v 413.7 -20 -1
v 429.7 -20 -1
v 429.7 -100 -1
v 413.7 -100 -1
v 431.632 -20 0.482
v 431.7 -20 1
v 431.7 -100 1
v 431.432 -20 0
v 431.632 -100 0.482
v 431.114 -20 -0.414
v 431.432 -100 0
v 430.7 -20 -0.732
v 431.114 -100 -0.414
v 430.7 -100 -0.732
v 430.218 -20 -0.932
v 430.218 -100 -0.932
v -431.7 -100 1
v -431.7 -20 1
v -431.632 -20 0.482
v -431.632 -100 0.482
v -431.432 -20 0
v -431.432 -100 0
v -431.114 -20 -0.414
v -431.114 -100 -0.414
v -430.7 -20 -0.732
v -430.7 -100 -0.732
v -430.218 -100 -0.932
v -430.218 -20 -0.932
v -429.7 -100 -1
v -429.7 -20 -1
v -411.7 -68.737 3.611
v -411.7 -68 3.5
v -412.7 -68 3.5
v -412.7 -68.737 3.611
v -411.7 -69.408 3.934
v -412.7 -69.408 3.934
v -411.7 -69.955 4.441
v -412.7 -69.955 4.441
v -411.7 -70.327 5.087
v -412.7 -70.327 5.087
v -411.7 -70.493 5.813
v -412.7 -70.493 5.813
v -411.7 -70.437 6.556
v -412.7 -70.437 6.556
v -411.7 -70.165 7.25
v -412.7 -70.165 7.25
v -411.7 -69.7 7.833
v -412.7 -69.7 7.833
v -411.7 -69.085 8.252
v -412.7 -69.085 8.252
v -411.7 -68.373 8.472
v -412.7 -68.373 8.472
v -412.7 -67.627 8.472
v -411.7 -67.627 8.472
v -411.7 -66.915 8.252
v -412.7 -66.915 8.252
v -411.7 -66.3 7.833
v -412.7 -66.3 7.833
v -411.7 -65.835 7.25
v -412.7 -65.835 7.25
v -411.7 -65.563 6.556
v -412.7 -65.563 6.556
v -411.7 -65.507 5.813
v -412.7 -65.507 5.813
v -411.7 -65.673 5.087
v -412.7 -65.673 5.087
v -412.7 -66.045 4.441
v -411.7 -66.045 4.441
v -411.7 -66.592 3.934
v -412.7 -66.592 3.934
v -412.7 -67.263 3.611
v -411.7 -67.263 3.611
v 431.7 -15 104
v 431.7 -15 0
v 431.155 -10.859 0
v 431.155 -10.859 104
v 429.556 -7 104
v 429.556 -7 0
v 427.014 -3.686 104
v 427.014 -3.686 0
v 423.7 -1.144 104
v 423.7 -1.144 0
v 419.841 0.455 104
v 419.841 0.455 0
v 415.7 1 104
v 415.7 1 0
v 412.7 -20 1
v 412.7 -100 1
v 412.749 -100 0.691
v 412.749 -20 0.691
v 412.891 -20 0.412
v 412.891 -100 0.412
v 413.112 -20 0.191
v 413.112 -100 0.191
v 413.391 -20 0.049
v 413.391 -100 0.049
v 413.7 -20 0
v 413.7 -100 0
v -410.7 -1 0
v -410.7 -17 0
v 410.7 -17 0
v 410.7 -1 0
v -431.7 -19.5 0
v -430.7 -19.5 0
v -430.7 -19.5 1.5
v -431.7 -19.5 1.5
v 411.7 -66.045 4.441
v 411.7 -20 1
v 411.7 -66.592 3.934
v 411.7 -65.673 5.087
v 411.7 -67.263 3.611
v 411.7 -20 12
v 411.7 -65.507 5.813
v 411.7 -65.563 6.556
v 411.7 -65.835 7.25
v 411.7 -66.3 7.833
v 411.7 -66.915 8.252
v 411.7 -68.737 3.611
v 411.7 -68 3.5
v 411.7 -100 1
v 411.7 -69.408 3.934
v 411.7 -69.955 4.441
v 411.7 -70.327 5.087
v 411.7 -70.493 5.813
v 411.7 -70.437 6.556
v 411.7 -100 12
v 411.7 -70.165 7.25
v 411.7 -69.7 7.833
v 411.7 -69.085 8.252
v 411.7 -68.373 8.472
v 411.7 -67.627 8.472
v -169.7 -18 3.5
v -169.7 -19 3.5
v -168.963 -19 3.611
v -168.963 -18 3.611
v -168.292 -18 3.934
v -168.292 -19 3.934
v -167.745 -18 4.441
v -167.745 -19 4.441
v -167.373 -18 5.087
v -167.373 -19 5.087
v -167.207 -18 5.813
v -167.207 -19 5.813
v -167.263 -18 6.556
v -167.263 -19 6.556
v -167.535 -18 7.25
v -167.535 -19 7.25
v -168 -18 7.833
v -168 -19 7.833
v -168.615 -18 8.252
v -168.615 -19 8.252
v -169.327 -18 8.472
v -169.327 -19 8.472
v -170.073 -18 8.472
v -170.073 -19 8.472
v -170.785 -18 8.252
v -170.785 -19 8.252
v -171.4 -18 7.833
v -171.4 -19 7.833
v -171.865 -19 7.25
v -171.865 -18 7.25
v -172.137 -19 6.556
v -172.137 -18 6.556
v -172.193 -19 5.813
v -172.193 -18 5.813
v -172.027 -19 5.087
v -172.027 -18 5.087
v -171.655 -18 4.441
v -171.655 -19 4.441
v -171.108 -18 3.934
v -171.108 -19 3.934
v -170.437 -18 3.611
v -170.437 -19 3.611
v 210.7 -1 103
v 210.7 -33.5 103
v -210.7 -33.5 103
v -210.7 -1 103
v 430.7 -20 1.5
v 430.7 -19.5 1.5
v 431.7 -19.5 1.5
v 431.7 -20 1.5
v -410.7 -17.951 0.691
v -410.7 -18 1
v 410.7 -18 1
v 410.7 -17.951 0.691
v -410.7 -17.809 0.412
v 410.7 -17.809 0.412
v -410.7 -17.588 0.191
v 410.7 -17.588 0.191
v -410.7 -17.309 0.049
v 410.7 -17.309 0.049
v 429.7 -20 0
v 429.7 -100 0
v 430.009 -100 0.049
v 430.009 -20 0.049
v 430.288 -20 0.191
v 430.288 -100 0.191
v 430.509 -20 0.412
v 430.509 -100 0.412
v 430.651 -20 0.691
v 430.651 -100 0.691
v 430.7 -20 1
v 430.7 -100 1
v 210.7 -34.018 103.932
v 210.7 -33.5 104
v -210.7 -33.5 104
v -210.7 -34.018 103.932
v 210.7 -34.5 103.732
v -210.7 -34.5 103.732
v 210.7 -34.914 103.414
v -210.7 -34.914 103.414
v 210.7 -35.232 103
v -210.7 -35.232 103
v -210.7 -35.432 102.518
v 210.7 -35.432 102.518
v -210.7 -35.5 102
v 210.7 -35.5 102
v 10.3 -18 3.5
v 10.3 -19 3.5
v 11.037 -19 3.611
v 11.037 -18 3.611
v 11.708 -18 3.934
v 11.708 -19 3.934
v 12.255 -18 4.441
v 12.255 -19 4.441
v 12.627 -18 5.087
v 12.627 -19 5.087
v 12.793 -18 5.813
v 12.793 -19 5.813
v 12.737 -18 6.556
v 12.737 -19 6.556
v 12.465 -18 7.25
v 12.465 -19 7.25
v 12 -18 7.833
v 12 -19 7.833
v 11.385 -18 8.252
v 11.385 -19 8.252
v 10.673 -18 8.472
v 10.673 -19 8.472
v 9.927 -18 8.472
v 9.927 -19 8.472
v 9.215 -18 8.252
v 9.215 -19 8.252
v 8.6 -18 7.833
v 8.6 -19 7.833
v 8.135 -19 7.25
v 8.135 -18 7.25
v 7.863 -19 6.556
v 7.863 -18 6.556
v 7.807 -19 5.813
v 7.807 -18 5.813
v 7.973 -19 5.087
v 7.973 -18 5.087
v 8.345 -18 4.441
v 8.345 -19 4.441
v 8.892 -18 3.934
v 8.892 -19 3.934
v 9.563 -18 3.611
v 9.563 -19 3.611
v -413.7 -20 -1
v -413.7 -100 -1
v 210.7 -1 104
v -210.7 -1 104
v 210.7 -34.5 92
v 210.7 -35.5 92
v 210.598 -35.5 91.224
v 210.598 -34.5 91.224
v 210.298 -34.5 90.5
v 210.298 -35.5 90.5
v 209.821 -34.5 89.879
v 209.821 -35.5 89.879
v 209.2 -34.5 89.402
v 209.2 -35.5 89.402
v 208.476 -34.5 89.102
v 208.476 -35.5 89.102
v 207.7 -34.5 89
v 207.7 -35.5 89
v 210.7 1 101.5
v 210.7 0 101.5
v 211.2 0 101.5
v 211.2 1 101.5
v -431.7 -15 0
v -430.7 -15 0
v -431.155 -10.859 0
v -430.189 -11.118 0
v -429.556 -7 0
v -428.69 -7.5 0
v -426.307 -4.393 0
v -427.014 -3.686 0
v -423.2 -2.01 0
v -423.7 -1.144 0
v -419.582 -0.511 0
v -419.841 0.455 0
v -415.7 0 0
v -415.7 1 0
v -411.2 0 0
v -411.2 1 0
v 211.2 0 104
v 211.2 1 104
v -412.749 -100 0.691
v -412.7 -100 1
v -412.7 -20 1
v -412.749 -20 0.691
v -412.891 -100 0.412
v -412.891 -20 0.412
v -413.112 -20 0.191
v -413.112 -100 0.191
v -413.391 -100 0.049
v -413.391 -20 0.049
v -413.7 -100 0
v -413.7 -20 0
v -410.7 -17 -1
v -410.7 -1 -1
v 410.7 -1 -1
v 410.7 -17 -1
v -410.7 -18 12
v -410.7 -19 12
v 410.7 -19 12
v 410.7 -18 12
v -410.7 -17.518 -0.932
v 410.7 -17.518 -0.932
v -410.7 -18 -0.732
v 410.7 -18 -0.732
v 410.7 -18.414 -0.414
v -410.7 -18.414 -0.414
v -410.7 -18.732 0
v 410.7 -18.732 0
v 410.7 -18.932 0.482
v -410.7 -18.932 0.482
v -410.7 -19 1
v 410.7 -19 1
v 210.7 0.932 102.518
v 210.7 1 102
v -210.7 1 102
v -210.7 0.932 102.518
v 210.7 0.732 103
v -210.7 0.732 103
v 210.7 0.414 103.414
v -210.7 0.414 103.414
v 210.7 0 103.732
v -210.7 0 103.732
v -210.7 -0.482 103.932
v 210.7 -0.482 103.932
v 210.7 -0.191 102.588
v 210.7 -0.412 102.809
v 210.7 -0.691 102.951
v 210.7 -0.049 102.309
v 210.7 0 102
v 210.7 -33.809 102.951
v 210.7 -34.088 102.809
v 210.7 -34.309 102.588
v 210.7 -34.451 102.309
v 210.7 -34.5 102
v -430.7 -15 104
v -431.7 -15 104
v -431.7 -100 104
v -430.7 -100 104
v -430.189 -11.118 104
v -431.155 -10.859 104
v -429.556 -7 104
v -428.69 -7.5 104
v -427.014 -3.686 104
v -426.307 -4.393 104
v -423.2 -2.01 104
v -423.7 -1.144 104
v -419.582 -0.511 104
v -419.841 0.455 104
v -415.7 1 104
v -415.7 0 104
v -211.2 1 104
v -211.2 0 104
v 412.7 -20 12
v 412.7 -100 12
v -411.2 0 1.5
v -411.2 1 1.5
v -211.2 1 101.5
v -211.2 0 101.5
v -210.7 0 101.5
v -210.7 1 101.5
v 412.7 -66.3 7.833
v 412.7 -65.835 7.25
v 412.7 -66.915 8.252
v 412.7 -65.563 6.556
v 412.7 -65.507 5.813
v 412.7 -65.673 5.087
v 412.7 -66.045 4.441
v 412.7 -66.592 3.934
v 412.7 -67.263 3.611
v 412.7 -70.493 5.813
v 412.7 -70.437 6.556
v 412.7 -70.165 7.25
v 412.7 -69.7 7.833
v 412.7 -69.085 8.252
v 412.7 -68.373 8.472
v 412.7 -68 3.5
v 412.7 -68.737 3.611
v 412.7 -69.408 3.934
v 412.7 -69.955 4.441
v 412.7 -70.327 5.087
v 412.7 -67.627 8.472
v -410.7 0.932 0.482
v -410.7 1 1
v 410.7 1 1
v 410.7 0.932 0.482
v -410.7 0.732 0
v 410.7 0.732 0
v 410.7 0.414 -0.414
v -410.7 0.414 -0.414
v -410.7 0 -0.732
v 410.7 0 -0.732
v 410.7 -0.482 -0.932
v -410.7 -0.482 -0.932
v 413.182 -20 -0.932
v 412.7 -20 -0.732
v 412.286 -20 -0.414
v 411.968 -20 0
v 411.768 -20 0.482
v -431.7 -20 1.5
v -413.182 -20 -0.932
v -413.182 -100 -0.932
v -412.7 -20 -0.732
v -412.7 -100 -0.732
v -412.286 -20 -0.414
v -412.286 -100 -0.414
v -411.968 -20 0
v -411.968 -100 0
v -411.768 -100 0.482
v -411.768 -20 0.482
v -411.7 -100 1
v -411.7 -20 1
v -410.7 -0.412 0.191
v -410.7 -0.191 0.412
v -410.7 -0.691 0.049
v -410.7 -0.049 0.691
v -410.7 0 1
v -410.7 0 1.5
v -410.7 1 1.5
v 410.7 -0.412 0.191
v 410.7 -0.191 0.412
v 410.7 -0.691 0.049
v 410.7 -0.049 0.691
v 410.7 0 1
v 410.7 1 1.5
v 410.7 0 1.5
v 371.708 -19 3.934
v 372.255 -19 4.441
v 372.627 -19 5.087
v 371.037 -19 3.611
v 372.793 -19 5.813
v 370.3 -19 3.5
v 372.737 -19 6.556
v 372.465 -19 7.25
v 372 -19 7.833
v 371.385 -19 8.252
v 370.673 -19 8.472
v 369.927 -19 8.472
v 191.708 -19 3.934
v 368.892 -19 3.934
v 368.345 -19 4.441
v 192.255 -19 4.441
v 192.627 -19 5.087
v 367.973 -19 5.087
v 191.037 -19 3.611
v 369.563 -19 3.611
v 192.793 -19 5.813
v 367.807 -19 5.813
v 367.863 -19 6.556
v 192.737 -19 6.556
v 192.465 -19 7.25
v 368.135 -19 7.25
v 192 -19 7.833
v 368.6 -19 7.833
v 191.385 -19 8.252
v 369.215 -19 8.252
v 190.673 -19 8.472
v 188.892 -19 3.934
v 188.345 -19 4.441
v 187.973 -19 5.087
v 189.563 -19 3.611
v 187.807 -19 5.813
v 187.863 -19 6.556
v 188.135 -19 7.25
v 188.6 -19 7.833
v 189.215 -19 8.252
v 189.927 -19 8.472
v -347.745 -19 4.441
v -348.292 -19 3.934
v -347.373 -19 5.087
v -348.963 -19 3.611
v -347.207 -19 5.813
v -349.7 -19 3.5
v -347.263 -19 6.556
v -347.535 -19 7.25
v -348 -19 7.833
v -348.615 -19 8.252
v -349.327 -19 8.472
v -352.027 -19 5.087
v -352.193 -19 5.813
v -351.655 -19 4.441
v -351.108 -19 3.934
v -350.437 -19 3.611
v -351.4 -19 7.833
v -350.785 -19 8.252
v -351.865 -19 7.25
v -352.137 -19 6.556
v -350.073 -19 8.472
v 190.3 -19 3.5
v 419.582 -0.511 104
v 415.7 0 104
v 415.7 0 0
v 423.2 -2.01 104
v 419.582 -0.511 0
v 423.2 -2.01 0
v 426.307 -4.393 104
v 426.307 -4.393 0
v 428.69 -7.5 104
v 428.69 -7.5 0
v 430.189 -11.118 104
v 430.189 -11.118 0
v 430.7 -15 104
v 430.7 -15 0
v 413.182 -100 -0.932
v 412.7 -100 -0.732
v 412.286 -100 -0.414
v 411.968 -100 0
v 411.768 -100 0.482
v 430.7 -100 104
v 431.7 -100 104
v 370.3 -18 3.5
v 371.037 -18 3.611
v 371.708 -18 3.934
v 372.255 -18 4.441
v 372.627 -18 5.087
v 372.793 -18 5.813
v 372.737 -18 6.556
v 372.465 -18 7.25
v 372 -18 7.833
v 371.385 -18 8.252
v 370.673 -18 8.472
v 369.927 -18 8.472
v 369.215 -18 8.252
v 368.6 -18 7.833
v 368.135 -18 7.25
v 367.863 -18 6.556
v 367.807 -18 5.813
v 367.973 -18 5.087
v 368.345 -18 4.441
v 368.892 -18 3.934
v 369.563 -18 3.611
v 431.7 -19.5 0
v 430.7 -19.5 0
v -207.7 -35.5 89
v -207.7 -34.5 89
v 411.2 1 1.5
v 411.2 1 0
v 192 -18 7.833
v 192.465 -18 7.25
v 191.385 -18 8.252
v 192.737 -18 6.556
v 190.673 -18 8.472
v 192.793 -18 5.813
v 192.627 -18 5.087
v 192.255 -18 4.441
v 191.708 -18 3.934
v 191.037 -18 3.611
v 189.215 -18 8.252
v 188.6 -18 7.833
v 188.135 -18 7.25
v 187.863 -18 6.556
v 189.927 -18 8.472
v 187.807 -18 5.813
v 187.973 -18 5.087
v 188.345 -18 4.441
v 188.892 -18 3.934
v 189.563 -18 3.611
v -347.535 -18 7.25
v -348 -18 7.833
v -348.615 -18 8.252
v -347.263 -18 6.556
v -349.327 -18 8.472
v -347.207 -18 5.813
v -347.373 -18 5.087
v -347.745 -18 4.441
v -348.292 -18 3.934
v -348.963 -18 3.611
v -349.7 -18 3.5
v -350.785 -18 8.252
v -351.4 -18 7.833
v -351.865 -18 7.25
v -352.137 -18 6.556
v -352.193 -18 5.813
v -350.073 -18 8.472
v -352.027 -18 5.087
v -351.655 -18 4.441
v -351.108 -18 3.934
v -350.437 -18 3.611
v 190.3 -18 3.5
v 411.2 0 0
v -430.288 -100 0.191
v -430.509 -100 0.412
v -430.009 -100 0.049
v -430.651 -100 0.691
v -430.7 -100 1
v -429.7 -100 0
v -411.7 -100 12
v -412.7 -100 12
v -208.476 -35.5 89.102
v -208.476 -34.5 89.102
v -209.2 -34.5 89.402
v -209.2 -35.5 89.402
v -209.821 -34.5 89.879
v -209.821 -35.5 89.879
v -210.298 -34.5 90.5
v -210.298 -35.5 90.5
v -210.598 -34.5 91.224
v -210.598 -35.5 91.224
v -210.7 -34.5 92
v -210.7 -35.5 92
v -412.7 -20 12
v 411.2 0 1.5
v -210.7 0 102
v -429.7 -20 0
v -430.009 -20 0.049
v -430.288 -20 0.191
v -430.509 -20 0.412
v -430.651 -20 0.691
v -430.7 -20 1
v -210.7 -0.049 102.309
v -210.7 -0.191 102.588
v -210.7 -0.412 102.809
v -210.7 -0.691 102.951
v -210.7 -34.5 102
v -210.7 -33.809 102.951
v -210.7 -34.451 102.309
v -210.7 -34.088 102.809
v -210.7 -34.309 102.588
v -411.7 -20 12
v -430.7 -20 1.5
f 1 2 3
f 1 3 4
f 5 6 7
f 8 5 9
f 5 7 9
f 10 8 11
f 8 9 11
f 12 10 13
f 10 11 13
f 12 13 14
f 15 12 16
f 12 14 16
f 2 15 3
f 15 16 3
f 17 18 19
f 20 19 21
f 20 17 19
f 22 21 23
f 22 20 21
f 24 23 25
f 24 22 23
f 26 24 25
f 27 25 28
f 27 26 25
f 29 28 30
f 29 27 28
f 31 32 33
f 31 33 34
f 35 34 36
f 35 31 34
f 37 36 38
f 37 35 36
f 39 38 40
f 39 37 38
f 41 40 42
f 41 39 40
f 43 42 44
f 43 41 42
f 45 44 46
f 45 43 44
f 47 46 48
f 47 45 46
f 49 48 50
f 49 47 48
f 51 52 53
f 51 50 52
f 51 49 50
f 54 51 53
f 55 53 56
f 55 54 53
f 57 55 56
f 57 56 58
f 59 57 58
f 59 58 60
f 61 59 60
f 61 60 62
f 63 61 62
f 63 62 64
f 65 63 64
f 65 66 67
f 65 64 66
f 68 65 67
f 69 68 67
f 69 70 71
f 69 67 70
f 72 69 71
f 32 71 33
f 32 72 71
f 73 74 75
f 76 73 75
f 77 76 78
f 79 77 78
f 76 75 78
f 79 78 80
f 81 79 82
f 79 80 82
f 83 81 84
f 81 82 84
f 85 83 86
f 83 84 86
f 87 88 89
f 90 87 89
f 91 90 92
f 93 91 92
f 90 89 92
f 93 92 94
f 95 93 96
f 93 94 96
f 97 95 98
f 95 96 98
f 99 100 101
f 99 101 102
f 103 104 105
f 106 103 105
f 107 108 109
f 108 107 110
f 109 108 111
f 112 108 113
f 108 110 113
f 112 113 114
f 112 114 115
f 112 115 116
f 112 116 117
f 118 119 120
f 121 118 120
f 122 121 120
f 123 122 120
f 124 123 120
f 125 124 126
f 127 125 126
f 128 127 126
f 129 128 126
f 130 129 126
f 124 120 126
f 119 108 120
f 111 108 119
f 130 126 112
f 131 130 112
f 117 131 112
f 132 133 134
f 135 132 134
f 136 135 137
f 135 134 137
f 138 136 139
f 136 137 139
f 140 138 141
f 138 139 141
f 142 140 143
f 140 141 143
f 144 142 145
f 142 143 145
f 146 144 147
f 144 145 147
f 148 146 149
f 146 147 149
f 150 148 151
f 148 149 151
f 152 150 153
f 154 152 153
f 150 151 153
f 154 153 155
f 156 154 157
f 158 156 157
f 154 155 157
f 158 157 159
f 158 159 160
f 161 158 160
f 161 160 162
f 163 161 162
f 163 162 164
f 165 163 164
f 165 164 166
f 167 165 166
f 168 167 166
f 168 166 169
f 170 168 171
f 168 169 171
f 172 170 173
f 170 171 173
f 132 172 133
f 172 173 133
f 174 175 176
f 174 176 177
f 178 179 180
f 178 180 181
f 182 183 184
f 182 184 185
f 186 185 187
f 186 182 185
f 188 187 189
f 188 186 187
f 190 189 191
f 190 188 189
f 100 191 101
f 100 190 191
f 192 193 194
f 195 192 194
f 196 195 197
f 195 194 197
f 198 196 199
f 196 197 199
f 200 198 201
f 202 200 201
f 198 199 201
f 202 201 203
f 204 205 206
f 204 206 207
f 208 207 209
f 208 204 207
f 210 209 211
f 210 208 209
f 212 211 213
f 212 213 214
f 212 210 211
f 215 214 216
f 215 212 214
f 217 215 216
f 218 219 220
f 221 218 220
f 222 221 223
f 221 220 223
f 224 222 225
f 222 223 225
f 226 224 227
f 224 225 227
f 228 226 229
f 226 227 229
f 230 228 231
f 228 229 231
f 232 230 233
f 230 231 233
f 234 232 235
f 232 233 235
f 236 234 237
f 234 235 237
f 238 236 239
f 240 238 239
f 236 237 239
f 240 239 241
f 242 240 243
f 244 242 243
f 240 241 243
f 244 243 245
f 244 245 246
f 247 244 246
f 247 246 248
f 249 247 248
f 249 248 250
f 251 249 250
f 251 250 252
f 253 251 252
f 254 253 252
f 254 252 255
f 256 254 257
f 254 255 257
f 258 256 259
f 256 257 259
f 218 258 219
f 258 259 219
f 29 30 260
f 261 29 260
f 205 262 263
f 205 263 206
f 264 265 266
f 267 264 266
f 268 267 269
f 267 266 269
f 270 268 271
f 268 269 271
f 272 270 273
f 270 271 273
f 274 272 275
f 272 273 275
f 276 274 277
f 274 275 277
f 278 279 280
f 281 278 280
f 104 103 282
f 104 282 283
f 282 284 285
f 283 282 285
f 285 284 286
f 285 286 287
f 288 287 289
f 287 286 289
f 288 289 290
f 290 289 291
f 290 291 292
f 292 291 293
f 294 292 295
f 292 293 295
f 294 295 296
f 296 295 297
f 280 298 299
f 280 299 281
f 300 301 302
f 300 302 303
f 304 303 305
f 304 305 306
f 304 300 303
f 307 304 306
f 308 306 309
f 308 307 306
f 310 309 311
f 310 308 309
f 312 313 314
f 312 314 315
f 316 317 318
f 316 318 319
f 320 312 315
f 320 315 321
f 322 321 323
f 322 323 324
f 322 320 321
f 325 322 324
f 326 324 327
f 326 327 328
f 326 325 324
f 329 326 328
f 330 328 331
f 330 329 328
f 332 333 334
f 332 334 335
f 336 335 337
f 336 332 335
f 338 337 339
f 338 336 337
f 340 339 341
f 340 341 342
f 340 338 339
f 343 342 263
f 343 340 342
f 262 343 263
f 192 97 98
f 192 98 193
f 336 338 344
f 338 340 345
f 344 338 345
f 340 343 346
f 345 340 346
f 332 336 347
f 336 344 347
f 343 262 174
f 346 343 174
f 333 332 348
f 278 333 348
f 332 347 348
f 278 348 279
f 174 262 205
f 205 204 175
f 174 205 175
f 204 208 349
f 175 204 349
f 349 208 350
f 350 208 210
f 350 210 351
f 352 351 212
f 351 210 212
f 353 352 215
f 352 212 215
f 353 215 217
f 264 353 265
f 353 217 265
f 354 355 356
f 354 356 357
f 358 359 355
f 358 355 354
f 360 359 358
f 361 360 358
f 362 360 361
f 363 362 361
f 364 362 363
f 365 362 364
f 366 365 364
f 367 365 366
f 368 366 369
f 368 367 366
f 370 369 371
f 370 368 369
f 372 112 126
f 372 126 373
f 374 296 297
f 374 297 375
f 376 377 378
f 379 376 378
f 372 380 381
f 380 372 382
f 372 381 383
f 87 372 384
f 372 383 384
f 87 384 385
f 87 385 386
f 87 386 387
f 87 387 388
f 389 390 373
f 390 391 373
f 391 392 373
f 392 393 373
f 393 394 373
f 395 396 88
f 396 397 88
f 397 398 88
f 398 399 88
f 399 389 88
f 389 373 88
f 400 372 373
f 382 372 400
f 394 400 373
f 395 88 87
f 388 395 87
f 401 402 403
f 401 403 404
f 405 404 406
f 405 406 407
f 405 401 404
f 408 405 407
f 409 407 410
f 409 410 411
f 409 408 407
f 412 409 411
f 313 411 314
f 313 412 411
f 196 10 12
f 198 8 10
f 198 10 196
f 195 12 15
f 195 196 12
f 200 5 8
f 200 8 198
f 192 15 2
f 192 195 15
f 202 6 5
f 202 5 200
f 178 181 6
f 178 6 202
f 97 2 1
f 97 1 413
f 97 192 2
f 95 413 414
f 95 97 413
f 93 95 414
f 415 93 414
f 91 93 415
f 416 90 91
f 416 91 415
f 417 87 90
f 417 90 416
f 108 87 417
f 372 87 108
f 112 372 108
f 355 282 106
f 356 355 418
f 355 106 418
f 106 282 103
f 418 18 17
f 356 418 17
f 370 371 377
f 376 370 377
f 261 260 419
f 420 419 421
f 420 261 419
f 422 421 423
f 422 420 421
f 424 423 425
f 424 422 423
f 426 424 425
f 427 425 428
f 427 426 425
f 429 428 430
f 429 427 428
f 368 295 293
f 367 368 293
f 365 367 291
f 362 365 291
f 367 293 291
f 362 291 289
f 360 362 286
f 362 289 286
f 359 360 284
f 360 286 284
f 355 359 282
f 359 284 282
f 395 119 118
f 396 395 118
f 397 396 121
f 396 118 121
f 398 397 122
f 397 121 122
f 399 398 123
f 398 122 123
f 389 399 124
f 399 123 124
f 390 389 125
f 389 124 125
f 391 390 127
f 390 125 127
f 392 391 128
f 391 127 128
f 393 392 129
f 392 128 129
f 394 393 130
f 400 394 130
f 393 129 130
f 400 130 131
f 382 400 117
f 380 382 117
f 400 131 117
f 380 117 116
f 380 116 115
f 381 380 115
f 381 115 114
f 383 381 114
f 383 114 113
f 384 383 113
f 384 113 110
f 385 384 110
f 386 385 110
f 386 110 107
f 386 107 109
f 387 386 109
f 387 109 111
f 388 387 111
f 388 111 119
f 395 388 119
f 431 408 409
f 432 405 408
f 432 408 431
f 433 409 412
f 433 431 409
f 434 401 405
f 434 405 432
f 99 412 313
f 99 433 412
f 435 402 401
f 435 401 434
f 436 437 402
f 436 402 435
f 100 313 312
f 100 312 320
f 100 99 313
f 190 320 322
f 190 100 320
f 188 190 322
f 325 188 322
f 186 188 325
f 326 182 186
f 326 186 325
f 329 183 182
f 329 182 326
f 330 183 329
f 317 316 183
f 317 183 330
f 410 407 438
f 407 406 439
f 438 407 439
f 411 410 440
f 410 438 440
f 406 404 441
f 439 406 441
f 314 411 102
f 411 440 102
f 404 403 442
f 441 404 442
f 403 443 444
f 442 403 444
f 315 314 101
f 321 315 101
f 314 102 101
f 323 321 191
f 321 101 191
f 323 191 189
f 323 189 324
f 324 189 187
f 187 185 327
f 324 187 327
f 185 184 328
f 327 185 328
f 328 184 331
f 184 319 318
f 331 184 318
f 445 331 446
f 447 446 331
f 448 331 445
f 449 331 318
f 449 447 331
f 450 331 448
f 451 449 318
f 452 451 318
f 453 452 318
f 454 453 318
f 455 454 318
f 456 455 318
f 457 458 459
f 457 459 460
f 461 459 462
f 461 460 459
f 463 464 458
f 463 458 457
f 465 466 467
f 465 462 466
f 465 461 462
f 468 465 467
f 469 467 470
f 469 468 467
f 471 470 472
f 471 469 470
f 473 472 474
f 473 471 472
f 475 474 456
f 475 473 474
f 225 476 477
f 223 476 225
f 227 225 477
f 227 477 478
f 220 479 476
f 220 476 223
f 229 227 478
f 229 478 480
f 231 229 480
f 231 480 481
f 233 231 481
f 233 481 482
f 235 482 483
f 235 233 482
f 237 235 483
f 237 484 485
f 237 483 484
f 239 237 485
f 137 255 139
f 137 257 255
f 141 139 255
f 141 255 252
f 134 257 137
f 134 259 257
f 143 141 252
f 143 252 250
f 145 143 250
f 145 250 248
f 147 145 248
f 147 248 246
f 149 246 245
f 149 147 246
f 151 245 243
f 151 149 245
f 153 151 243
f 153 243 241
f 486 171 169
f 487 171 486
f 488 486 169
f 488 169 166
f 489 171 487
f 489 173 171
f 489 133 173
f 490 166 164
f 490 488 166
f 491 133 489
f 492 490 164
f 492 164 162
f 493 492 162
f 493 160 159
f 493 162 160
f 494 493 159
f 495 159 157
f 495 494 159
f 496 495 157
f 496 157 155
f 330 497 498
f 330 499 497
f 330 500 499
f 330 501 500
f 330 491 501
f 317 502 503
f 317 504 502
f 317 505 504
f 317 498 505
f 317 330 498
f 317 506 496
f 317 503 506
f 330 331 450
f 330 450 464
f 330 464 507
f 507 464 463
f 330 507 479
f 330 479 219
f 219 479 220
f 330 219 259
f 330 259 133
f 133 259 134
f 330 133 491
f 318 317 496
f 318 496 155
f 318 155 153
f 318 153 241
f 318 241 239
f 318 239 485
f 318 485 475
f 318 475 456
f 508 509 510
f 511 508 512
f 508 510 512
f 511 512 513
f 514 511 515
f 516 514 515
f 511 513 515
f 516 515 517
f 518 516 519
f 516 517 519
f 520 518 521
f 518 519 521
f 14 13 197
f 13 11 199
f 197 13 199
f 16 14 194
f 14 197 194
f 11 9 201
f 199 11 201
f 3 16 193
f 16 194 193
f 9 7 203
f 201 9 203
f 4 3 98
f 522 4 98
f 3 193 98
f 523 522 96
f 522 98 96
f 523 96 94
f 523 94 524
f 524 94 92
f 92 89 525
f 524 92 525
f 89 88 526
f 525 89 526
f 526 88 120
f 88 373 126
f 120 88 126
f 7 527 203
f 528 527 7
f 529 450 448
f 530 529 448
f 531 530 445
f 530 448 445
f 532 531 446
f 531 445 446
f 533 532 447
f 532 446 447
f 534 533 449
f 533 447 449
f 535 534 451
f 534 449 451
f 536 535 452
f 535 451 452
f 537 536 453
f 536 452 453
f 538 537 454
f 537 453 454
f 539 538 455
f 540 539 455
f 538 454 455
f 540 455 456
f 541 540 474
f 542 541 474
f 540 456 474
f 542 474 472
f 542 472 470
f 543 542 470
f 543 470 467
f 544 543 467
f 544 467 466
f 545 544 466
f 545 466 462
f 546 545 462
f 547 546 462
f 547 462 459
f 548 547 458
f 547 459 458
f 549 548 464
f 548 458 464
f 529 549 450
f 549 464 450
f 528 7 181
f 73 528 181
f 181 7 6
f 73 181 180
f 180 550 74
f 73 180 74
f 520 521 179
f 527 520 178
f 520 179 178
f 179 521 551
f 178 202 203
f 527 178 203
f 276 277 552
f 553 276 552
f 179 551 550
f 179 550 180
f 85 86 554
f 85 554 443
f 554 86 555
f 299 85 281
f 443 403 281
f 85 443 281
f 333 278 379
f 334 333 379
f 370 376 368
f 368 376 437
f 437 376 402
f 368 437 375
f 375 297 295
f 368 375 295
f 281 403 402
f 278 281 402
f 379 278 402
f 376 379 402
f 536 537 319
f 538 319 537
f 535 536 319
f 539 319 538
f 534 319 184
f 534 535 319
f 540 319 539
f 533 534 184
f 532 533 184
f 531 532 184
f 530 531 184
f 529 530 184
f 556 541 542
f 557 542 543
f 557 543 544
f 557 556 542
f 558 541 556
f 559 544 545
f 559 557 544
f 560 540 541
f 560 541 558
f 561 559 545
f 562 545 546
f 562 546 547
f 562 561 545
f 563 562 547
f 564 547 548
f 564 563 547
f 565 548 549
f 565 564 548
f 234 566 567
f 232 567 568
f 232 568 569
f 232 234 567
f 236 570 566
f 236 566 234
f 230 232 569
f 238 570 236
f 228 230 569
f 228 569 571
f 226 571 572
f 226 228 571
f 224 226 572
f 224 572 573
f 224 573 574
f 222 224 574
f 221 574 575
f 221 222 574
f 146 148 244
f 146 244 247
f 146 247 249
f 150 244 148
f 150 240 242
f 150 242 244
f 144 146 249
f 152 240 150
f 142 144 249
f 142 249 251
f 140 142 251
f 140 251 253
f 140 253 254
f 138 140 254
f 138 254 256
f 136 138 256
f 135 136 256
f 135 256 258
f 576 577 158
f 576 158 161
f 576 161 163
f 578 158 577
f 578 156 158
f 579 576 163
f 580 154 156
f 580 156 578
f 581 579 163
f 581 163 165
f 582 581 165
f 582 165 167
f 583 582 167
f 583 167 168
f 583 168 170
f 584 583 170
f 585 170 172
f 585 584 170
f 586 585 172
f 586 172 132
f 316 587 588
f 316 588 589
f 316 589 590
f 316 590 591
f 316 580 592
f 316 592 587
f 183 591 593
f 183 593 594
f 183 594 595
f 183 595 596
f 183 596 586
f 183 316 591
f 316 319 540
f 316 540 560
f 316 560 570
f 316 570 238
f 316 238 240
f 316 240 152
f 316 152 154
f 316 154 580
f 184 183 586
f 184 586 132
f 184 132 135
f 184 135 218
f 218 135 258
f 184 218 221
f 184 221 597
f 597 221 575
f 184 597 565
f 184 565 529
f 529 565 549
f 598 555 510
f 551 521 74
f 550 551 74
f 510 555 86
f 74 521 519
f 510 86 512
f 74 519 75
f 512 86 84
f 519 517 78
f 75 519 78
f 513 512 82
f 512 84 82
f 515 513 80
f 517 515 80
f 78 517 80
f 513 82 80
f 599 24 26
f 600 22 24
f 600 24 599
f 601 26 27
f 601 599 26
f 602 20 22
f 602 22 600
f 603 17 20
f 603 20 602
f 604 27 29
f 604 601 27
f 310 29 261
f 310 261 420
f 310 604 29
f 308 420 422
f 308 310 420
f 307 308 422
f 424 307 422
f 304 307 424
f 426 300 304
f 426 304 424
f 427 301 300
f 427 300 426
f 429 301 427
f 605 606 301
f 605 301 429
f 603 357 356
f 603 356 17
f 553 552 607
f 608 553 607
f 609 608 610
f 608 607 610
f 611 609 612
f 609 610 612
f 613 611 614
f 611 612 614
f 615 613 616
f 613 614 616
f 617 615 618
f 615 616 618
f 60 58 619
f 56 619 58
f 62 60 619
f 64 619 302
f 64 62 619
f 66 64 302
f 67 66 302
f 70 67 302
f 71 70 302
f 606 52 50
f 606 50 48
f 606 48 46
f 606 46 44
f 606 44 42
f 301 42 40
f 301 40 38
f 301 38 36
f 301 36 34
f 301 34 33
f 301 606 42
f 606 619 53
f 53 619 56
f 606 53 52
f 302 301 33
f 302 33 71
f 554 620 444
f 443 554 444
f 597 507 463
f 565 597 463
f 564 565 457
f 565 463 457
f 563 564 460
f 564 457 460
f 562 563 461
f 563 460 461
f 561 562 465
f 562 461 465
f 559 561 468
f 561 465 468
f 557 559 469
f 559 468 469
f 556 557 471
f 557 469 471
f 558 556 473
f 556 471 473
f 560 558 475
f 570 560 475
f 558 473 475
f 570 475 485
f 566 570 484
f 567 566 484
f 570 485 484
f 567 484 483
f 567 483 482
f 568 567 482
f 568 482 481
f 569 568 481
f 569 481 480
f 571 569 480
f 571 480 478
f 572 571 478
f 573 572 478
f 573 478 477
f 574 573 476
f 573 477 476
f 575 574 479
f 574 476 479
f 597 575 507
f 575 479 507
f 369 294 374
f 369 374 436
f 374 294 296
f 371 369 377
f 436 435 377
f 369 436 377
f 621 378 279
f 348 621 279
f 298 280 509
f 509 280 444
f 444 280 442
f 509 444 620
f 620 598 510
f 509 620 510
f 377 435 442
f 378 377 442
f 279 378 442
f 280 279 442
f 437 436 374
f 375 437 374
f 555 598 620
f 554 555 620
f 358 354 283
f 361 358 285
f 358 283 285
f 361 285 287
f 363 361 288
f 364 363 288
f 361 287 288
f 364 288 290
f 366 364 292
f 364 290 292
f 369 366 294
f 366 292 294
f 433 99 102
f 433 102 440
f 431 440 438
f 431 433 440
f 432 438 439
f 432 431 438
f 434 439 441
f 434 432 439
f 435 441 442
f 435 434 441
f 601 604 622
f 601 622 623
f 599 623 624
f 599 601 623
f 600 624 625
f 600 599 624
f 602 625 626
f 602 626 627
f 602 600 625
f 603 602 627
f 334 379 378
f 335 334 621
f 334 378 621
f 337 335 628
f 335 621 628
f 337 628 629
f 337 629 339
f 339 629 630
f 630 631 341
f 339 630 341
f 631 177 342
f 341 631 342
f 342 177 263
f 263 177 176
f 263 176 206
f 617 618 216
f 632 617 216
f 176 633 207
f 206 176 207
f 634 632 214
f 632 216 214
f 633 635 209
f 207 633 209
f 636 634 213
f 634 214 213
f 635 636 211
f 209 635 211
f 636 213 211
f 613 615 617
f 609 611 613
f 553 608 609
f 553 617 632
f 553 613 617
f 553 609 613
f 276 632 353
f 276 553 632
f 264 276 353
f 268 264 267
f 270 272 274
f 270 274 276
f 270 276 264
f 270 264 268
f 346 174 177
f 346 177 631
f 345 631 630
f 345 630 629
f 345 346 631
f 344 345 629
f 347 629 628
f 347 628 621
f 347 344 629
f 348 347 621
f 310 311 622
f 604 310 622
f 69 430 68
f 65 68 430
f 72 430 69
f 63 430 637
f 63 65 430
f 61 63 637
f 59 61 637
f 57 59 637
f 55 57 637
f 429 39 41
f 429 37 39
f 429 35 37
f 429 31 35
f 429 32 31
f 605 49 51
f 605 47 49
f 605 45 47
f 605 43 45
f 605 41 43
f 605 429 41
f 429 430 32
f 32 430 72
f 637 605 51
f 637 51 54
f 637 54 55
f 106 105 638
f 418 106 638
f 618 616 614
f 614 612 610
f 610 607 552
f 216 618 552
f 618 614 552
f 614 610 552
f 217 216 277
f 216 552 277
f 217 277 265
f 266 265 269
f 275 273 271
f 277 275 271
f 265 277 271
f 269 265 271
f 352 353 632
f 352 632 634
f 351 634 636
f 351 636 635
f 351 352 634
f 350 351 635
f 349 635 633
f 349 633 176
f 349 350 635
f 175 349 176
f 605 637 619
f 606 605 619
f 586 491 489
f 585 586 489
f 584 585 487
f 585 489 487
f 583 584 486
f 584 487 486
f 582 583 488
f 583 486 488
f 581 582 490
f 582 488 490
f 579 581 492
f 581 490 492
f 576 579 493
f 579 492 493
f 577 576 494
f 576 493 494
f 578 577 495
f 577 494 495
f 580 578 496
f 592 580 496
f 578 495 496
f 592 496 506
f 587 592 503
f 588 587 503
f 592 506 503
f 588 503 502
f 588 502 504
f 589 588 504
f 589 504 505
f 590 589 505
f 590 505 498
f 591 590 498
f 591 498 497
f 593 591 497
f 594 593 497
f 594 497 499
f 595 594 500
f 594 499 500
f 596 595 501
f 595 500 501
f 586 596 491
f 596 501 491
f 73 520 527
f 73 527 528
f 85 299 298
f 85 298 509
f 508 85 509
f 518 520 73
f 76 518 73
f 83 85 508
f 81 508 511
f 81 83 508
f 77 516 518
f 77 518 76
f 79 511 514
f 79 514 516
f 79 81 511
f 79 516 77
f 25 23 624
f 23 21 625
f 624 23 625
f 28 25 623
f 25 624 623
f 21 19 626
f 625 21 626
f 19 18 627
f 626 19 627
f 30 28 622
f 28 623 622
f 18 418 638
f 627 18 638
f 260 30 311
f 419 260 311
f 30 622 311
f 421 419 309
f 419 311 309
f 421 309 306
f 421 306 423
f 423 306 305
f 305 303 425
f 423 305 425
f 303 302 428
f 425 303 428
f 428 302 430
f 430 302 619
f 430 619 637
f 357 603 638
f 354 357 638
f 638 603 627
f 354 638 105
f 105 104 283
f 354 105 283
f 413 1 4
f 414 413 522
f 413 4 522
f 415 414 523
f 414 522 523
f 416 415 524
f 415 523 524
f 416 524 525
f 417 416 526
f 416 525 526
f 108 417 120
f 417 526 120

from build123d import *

# Parameters (mm, degrees)
BASE_FLANGE1_DEPTH             = 104
EDGE_FLANGE1_STRIP_W           = 6
EDGE_FLANGE1_STRIP_H           = 1
EDGE_FLANGE1_STRIP_CUT_DEPTH   = 821.4
EDGE_FLANGE1_RELIEF_W          = 6.5
EDGE_FLANGE1_RELIEF_H          = 0.5
EDGE_FLANGE1_RELIEF_CUT_DEPTH  = 1
EDGE_FLANGE1_DEPTH             = 821.4
EDGE_FLANGE2_STRIP_W           = 6
EDGE_FLANGE2_STRIP_H           = 1
EDGE_FLANGE2_STRIP_CUT_DEPTH   = 821.4
EDGE_FLANGE2_DEPTH             = 821.4
EDGE_FLANGE3_STRIP_W           = 6
EDGE_FLANGE3_STRIP_H           = 1
EDGE_FLANGE3_STRIP_CUT_DEPTH   = 80
EDGE_FLANGE3_RELIEF_W          = 6.5
EDGE_FLANGE3_RELIEF_H          = 0.5
EDGE_FLANGE3_RELIEF_CUT_DEPTH  = 1
EDGE_FLANGE3_DEPTH             = 80
EDGE_FLANGE4_STRIP_W           = 6
EDGE_FLANGE4_STRIP_H           = 1
EDGE_FLANGE4_STRIP_CUT_DEPTH   = 80
EDGE_FLANGE4_DEPTH             = 80
EDGE_FLANGE5_STRIP_W           = 6
EDGE_FLANGE5_STRIP_H           = 1
EDGE_FLANGE5_STRIP_CUT_DEPTH   = 421.4
EDGE_FLANGE5_RELIEF_W          = 6.5
EDGE_FLANGE5_RELIEF_H          = 0.5
EDGE_FLANGE5_RELIEF_CUT_DEPTH  = 1
EDGE_FLANGE5_DEPTH             = 421.4
SKETCH22_R                     = 2.5
CUT_EXTRUDE1_DEPTH             = 1
SKETCH23_R                     = 2.5
CUT_EXTRUDE2_DEPTH             = 3
CUT_EXTRUDE2_DIRECTION_2_REACH = 857.652
EDGE_FLANGE6_STRIP_W           = 6
EDGE_FLANGE6_STRIP_H           = 1
EDGE_FLANGE6_STRIP_CUT_DEPTH   = 421.4
EDGE_FLANGE6_DEPTH             = 421.4
EDGE_FLANGE6_FLAT_DEPTH        = 1


# Sheet-metal steps are written as plain solids
with BuildPart() as part:
    # Sketch1 → Base-Flange1 (new body)
    with BuildSketch(Plane.XY):
        with BuildLine():
            Line((-430.7, -100), (-430.7, -15))
            ThreePointArc((-430.7, -15), (-426.306601718, -4.393398282), (-415.7, 0))
            Line((-415.7, 0), (415.7, 0))
            ThreePointArc((415.7, 0), (426.306601718, -4.393398282), (430.7, -15))
            Line((430.7, -15), (430.7, -100))
            Line((430.7, -100), (431.7, -100))
            Line((431.7, -100), (431.7, -15))
            ThreePointArc((431.7, -15), (427.013708499, -3.686291501), (415.7, 1))
            Line((415.7, 1), (-415.7, 1))
            ThreePointArc((-415.7, 1), (-427.013708499, -3.686291501), (-431.7, -15))
            Line((-431.7, -15), (-431.7, -100))
            Line((-431.7, -100), (-430.7, -100))
        make_face()
    extrude(amount=BASE_FLANGE1_DEPTH)

    # Edge-Flange1 strip (across the edge) → Edge-Flange1 strip cut (cut)
    with BuildSketch(Plane(origin=(-410.7, 0, 0), x_dir=(0, 0, 1), z_dir=(1, 0, 0))):
        with Locations((-2, -0.5)):
            Rectangle(EDGE_FLANGE1_STRIP_W, EDGE_FLANGE1_STRIP_H)
    extrude(amount=EDGE_FLANGE1_STRIP_CUT_DEPTH, mode=Mode.SUBTRACT)

    # Edge-Flange1 relief (on the sheet) → Edge-Flange1 relief cut (cut)
    with BuildSketch(Plane(origin=(-410.7, 0, 1), x_dir=(0, 0, 1), z_dir=(0, -1, 0))):
        with Locations((-2.75, 0.25)):
            Rectangle(EDGE_FLANGE1_RELIEF_W, EDGE_FLANGE1_RELIEF_H)
        with Locations((-2.75, -821.65)):
            Rectangle(EDGE_FLANGE1_RELIEF_W, EDGE_FLANGE1_RELIEF_H)
    extrude(amount=-EDGE_FLANGE1_RELIEF_CUT_DEPTH, mode=Mode.SUBTRACT)

    # Edge-Flange1 section (across the edge) → Edge-Flange1 (add)
    with BuildSketch(Plane(origin=(-410.7, 0, 0), x_dir=(0, 0, 1), z_dir=(1, 0, 0))):
        with BuildLine():
            Line((-1, 1), (-1, 19))
            Line((-1, 19), (0, 19))
            Line((0, 19), (0, 1))
            ThreePointArc((0, 1), (0.292893219, 0.292893219), (1, 0))
            Line((1, 0), (1, -1))
            ThreePointArc((1, -1), (-0.414213562, -0.414213562), (-1, 1))
        make_face()
    extrude(amount=EDGE_FLANGE1_DEPTH)

    # Edge-Flange2 strip (across the edge) → Edge-Flange2 strip cut (cut)
    with BuildSketch(Plane(origin=(-410.7, -19, 0), x_dir=(0, 1, 0), z_dir=(1, 0, 0))):
        with Locations((-1, -0.5)):
            Rectangle(EDGE_FLANGE2_STRIP_W, EDGE_FLANGE2_STRIP_H)
    extrude(amount=EDGE_FLANGE2_STRIP_CUT_DEPTH, mode=Mode.SUBTRACT)

    # Edge-Flange2 section (across the edge) → Edge-Flange2 (add)
    with BuildSketch(Plane(origin=(-410.7, -19, 0), x_dir=(0, 1, 0), z_dir=(1, 0, 0))):
        with BuildLine():
            Line((0, 1), (0, 12))
            Line((0, 12), (1, 12))
            Line((1, 12), (1, 1))
            ThreePointArc((1, 1), (1.292893219, 0.292893219), (2, 0))
            Line((2, 0), (2, -1))
            ThreePointArc((2, -1), (0.585786438, -0.414213562), (0, 1))
        make_face()
    extrude(amount=EDGE_FLANGE2_DEPTH)

    # Edge-Flange3 strip (across the edge) → Edge-Flange3 strip cut (cut)
    with BuildSketch(Plane(origin=(-430.7, -100, 0), x_dir=(0, 0, 1), z_dir=(0, 1, 0))):
        with Locations((-2, -0.5)):
            Rectangle(EDGE_FLANGE3_STRIP_W, EDGE_FLANGE3_STRIP_H)
    edge_flange3_strip_cut = extrude(amount=EDGE_FLANGE3_STRIP_CUT_DEPTH, mode=Mode.SUBTRACT)

    # Edge-Flange3 relief (on the sheet) → Edge-Flange3 relief cut (cut)
    with BuildSketch(Plane(origin=(-430.7, -100, 1), x_dir=(0, 0, 1), z_dir=(1, 0, 0))):
        with Locations((-2.75, -80.25)):
            Rectangle(EDGE_FLANGE3_RELIEF_W, EDGE_FLANGE3_RELIEF_H)
    edge_flange3_relief_cut = extrude(amount=-EDGE_FLANGE3_RELIEF_CUT_DEPTH, mode=Mode.SUBTRACT)

    # Edge-Flange3 section (across the edge) → Edge-Flange3 (add)
    with BuildSketch(Plane(origin=(-430.7, -100, 0), x_dir=(0, 0, 1), z_dir=(0, 1, 0))):
        with BuildLine():
            Line((-1, 1), (-1, 19))
            Line((-1, 19), (0, 19))
            Line((0, 19), (0, 1))
            ThreePointArc((0, 1), (0.292893219, 0.292893219), (1, 0))
            Line((1, 0), (1, -1))
            ThreePointArc((1, -1), (-0.414213562, -0.414213562), (-1, 1))
        make_face()
    edge_flange3 = extrude(amount=EDGE_FLANGE3_DEPTH)

    # Edge-Flange4 strip (across the edge) → Edge-Flange4 strip cut (cut)
    with BuildSketch(Plane(origin=(-411.7, -100, 0), x_dir=(-1, 0, 0), z_dir=(0, 1, 0))):
        with Locations((-1, -0.5)):
            Rectangle(EDGE_FLANGE4_STRIP_W, EDGE_FLANGE4_STRIP_H)
    edge_flange4_strip_cut = extrude(amount=EDGE_FLANGE4_STRIP_CUT_DEPTH, mode=Mode.SUBTRACT)

    # Edge-Flange4 section (across the edge) → Edge-Flange4 (add)
    with BuildSketch(Plane(origin=(-411.7, -100, 0), x_dir=(-1, 0, 0), z_dir=(0, 1, 0))):
        with BuildLine():
            Line((0, 1), (0, 12))
            Line((0, 12), (1, 12))
            Line((1, 12), (1, 1))
            ThreePointArc((1, 1), (1.292893219, 0.292893219), (2, 0))
            Line((2, 0), (2, -1))
            ThreePointArc((2, -1), (0.585786438, -0.414213562), (0, 1))
        make_face()
    edge_flange4 = extrude(amount=EDGE_FLANGE4_DEPTH)

    # Mirror1: Edge-Flange3 strip cut, Edge-Flange3 relief cut, Edge-Flange3, Edge-Flange4 strip cut, Edge-Flange4 across plane
    add(edge_flange3_strip_cut.mirror(Plane(origin=(0, 0, 0), x_dir=(0, 0, 1), z_dir=(1, 0, 0))), mode=Mode.SUBTRACT)
    add(edge_flange3_relief_cut.mirror(Plane(origin=(0, 0, 0), x_dir=(0, 0, 1), z_dir=(1, 0, 0))), mode=Mode.SUBTRACT)
    add(edge_flange3.mirror(Plane(origin=(0, 0, 0), x_dir=(0, 0, 1), z_dir=(1, 0, 0))))
    add(edge_flange4_strip_cut.mirror(Plane(origin=(0, 0, 0), x_dir=(0, 0, 1), z_dir=(1, 0, 0))), mode=Mode.SUBTRACT)
    add(edge_flange4.mirror(Plane(origin=(0, 0, 0), x_dir=(0, 0, 1), z_dir=(1, 0, 0))))

    # Edge-Flange5 strip (across the edge) → Edge-Flange5 strip cut (cut)
    with BuildSketch(Plane(origin=(210.7, 0, 104), x_dir=(0, 0, -1), z_dir=(-1, 0, 0))):
        with Locations((-1, -0.5)):
            Rectangle(EDGE_FLANGE5_STRIP_W, EDGE_FLANGE5_STRIP_H)
    extrude(amount=EDGE_FLANGE5_STRIP_CUT_DEPTH, mode=Mode.SUBTRACT)

    # Edge-Flange5 relief (on the sheet) → Edge-Flange5 relief cut (cut)
    with BuildSketch(Plane(origin=(210.7, 0, 102), x_dir=(0, 0, -1), z_dir=(0, -1, 0))):
        with Locations((-2.75, 0.25)):
            Rectangle(EDGE_FLANGE5_RELIEF_W, EDGE_FLANGE5_RELIEF_H)
        with Locations((-2.75, -421.65)):
            Rectangle(EDGE_FLANGE5_RELIEF_W, EDGE_FLANGE5_RELIEF_H)
    extrude(amount=-EDGE_FLANGE5_RELIEF_CUT_DEPTH, mode=Mode.SUBTRACT)

    # Edge-Flange5 section (across the edge) → Edge-Flange5 (add)
    with BuildSketch(Plane(origin=(210.7, 0, 104), x_dir=(0, 0, -1), z_dir=(-1, 0, 0))):
        with BuildLine():
            Line((0, 1), (0, 35.5))
            Line((0, 35.5), (1, 35.5))
            Line((1, 35.5), (1, 1))
            ThreePointArc((1, 1), (1.292893219, 0.292893219), (2, 0))
            Line((2, 0), (2, -1))
            ThreePointArc((2, -1), (0.585786438, -0.414213562), (0, 1))
        make_face()
    extrude(amount=EDGE_FLANGE5_DEPTH)

    # Sketch22 → Cut-Extrude1 (cut)
    with BuildSketch(Plane.XZ.offset(19)):
        with Locations(Location((-349.7, 6, 0), (0, 0, 270))):
            Circle(SKETCH22_R)
        with Locations(Location((-169.7, 6, 0), (0, 0, 270))):
            Circle(SKETCH22_R)
        with Locations(Location((10.3, 6, 0), (0, 0, 270))):
            Circle(SKETCH22_R)
        with Locations(Location((190.3, 6, 0), (0, 0, 270))):
            Circle(SKETCH22_R)
        with Locations(Location((370.3, 6, 0), (0, 0, 270))):
            Circle(SKETCH22_R)
        with Locations((550.3, 6)):
            Circle(SKETCH22_R)
        with Locations((730.3, 6)):
            Circle(SKETCH22_R)
    extrude(amount=-CUT_EXTRUDE1_DEPTH, mode=Mode.SUBTRACT)

    # Sketch23 → Cut-Extrude2 (cut)
    with BuildSketch(Plane.ZY.offset(-411.7)):
        with Locations(Location((6, -68, 0), (0, 0, 180))):
            Circle(SKETCH23_R)
    extrude(amount=-CUT_EXTRUDE2_DEPTH, mode=Mode.SUBTRACT)

    # Cut-Extrude2 direction 2: up to this face of the body (flat: up to its plane)
    cut_extrude2_direction_2_end = Plane(part.part.faces().sort_by_distance((-412.7, -60, 6.5))[0])
    # Sketch23 → Cut-Extrude2 direction 2 (cut, up to the picked face)
    with BuildSketch(Plane.ZY.offset(-411.7), mode=Mode.PRIVATE) as cut_extrude2_direction_2_sk1:
        with Locations(Location((6, -68, 0), (0, 0, 180))):
            Circle(SKETCH23_R)
    cut_extrude2_direction_2_tool1 = split(extrude(cut_extrude2_direction_2_sk1.sketch, amount=CUT_EXTRUDE2_DIRECTION_2_REACH, mode=Mode.PRIVATE), bisect_by=cut_extrude2_direction_2_end, keep=Keep.BOTH, mode=Mode.PRIVATE)
    add(cut_extrude2_direction_2_tool1.solids().sort_by(Axis((411.7, -68, 6), (-1, 0, 0)))[0], mode=Mode.SUBTRACT)

    # Edge-Flange6 strip (across the edge) → Edge-Flange6 strip cut (cut)
    with BuildSketch(Plane(origin=(210.7, -35.5, 103), x_dir=(0, 1, 0), z_dir=(-1, 0, 0))):
        with Locations((-1, -0.5)):
            Rectangle(EDGE_FLANGE6_STRIP_W, EDGE_FLANGE6_STRIP_H)
    extrude(amount=EDGE_FLANGE6_STRIP_CUT_DEPTH, mode=Mode.SUBTRACT)

    # Edge-Flange6 bend section (across the edge) → Edge-Flange6 (add)
    with BuildSketch(Plane(origin=(210.7, -35.5, 103), x_dir=(0, 1, 0), z_dir=(-1, 0, 0))):
        with BuildLine():
            Line((0, 1), (1, 1))
            ThreePointArc((1, 1), (1.292893219, 0.292893219), (2, 0))
            Line((2, 0), (2, -1))
            ThreePointArc((2, -1), (0.585786438, -0.414213562), (0, 1))
        make_face()
    extrude(amount=EDGE_FLANGE6_DEPTH)

    # Edge-Flange6 profile (on flange) → Edge-Flange6 flat (add)
    with BuildSketch(Plane(origin=(0, -35.5, 103), x_dir=(1, 0, 0), z_dir=(0, 1, 0))):
        with BuildLine():
            Line((-210.7, 1), (210.7, 1))
            Line((210.7, 1), (210.7, 11))
            ThreePointArc((210.7, 11), (209.821320344, 13.121320344), (207.7, 14))
            Line((207.7, 14), (-207.7, 14))
            ThreePointArc((-207.7, 14), (-209.821320344, 13.121320344), (-210.7, 11))
            Line((-210.7, 11), (-210.7, 1))
        make_face()
    extrude(amount=EDGE_FLANGE6_FLAT_DEPTH)


solid = part.part
